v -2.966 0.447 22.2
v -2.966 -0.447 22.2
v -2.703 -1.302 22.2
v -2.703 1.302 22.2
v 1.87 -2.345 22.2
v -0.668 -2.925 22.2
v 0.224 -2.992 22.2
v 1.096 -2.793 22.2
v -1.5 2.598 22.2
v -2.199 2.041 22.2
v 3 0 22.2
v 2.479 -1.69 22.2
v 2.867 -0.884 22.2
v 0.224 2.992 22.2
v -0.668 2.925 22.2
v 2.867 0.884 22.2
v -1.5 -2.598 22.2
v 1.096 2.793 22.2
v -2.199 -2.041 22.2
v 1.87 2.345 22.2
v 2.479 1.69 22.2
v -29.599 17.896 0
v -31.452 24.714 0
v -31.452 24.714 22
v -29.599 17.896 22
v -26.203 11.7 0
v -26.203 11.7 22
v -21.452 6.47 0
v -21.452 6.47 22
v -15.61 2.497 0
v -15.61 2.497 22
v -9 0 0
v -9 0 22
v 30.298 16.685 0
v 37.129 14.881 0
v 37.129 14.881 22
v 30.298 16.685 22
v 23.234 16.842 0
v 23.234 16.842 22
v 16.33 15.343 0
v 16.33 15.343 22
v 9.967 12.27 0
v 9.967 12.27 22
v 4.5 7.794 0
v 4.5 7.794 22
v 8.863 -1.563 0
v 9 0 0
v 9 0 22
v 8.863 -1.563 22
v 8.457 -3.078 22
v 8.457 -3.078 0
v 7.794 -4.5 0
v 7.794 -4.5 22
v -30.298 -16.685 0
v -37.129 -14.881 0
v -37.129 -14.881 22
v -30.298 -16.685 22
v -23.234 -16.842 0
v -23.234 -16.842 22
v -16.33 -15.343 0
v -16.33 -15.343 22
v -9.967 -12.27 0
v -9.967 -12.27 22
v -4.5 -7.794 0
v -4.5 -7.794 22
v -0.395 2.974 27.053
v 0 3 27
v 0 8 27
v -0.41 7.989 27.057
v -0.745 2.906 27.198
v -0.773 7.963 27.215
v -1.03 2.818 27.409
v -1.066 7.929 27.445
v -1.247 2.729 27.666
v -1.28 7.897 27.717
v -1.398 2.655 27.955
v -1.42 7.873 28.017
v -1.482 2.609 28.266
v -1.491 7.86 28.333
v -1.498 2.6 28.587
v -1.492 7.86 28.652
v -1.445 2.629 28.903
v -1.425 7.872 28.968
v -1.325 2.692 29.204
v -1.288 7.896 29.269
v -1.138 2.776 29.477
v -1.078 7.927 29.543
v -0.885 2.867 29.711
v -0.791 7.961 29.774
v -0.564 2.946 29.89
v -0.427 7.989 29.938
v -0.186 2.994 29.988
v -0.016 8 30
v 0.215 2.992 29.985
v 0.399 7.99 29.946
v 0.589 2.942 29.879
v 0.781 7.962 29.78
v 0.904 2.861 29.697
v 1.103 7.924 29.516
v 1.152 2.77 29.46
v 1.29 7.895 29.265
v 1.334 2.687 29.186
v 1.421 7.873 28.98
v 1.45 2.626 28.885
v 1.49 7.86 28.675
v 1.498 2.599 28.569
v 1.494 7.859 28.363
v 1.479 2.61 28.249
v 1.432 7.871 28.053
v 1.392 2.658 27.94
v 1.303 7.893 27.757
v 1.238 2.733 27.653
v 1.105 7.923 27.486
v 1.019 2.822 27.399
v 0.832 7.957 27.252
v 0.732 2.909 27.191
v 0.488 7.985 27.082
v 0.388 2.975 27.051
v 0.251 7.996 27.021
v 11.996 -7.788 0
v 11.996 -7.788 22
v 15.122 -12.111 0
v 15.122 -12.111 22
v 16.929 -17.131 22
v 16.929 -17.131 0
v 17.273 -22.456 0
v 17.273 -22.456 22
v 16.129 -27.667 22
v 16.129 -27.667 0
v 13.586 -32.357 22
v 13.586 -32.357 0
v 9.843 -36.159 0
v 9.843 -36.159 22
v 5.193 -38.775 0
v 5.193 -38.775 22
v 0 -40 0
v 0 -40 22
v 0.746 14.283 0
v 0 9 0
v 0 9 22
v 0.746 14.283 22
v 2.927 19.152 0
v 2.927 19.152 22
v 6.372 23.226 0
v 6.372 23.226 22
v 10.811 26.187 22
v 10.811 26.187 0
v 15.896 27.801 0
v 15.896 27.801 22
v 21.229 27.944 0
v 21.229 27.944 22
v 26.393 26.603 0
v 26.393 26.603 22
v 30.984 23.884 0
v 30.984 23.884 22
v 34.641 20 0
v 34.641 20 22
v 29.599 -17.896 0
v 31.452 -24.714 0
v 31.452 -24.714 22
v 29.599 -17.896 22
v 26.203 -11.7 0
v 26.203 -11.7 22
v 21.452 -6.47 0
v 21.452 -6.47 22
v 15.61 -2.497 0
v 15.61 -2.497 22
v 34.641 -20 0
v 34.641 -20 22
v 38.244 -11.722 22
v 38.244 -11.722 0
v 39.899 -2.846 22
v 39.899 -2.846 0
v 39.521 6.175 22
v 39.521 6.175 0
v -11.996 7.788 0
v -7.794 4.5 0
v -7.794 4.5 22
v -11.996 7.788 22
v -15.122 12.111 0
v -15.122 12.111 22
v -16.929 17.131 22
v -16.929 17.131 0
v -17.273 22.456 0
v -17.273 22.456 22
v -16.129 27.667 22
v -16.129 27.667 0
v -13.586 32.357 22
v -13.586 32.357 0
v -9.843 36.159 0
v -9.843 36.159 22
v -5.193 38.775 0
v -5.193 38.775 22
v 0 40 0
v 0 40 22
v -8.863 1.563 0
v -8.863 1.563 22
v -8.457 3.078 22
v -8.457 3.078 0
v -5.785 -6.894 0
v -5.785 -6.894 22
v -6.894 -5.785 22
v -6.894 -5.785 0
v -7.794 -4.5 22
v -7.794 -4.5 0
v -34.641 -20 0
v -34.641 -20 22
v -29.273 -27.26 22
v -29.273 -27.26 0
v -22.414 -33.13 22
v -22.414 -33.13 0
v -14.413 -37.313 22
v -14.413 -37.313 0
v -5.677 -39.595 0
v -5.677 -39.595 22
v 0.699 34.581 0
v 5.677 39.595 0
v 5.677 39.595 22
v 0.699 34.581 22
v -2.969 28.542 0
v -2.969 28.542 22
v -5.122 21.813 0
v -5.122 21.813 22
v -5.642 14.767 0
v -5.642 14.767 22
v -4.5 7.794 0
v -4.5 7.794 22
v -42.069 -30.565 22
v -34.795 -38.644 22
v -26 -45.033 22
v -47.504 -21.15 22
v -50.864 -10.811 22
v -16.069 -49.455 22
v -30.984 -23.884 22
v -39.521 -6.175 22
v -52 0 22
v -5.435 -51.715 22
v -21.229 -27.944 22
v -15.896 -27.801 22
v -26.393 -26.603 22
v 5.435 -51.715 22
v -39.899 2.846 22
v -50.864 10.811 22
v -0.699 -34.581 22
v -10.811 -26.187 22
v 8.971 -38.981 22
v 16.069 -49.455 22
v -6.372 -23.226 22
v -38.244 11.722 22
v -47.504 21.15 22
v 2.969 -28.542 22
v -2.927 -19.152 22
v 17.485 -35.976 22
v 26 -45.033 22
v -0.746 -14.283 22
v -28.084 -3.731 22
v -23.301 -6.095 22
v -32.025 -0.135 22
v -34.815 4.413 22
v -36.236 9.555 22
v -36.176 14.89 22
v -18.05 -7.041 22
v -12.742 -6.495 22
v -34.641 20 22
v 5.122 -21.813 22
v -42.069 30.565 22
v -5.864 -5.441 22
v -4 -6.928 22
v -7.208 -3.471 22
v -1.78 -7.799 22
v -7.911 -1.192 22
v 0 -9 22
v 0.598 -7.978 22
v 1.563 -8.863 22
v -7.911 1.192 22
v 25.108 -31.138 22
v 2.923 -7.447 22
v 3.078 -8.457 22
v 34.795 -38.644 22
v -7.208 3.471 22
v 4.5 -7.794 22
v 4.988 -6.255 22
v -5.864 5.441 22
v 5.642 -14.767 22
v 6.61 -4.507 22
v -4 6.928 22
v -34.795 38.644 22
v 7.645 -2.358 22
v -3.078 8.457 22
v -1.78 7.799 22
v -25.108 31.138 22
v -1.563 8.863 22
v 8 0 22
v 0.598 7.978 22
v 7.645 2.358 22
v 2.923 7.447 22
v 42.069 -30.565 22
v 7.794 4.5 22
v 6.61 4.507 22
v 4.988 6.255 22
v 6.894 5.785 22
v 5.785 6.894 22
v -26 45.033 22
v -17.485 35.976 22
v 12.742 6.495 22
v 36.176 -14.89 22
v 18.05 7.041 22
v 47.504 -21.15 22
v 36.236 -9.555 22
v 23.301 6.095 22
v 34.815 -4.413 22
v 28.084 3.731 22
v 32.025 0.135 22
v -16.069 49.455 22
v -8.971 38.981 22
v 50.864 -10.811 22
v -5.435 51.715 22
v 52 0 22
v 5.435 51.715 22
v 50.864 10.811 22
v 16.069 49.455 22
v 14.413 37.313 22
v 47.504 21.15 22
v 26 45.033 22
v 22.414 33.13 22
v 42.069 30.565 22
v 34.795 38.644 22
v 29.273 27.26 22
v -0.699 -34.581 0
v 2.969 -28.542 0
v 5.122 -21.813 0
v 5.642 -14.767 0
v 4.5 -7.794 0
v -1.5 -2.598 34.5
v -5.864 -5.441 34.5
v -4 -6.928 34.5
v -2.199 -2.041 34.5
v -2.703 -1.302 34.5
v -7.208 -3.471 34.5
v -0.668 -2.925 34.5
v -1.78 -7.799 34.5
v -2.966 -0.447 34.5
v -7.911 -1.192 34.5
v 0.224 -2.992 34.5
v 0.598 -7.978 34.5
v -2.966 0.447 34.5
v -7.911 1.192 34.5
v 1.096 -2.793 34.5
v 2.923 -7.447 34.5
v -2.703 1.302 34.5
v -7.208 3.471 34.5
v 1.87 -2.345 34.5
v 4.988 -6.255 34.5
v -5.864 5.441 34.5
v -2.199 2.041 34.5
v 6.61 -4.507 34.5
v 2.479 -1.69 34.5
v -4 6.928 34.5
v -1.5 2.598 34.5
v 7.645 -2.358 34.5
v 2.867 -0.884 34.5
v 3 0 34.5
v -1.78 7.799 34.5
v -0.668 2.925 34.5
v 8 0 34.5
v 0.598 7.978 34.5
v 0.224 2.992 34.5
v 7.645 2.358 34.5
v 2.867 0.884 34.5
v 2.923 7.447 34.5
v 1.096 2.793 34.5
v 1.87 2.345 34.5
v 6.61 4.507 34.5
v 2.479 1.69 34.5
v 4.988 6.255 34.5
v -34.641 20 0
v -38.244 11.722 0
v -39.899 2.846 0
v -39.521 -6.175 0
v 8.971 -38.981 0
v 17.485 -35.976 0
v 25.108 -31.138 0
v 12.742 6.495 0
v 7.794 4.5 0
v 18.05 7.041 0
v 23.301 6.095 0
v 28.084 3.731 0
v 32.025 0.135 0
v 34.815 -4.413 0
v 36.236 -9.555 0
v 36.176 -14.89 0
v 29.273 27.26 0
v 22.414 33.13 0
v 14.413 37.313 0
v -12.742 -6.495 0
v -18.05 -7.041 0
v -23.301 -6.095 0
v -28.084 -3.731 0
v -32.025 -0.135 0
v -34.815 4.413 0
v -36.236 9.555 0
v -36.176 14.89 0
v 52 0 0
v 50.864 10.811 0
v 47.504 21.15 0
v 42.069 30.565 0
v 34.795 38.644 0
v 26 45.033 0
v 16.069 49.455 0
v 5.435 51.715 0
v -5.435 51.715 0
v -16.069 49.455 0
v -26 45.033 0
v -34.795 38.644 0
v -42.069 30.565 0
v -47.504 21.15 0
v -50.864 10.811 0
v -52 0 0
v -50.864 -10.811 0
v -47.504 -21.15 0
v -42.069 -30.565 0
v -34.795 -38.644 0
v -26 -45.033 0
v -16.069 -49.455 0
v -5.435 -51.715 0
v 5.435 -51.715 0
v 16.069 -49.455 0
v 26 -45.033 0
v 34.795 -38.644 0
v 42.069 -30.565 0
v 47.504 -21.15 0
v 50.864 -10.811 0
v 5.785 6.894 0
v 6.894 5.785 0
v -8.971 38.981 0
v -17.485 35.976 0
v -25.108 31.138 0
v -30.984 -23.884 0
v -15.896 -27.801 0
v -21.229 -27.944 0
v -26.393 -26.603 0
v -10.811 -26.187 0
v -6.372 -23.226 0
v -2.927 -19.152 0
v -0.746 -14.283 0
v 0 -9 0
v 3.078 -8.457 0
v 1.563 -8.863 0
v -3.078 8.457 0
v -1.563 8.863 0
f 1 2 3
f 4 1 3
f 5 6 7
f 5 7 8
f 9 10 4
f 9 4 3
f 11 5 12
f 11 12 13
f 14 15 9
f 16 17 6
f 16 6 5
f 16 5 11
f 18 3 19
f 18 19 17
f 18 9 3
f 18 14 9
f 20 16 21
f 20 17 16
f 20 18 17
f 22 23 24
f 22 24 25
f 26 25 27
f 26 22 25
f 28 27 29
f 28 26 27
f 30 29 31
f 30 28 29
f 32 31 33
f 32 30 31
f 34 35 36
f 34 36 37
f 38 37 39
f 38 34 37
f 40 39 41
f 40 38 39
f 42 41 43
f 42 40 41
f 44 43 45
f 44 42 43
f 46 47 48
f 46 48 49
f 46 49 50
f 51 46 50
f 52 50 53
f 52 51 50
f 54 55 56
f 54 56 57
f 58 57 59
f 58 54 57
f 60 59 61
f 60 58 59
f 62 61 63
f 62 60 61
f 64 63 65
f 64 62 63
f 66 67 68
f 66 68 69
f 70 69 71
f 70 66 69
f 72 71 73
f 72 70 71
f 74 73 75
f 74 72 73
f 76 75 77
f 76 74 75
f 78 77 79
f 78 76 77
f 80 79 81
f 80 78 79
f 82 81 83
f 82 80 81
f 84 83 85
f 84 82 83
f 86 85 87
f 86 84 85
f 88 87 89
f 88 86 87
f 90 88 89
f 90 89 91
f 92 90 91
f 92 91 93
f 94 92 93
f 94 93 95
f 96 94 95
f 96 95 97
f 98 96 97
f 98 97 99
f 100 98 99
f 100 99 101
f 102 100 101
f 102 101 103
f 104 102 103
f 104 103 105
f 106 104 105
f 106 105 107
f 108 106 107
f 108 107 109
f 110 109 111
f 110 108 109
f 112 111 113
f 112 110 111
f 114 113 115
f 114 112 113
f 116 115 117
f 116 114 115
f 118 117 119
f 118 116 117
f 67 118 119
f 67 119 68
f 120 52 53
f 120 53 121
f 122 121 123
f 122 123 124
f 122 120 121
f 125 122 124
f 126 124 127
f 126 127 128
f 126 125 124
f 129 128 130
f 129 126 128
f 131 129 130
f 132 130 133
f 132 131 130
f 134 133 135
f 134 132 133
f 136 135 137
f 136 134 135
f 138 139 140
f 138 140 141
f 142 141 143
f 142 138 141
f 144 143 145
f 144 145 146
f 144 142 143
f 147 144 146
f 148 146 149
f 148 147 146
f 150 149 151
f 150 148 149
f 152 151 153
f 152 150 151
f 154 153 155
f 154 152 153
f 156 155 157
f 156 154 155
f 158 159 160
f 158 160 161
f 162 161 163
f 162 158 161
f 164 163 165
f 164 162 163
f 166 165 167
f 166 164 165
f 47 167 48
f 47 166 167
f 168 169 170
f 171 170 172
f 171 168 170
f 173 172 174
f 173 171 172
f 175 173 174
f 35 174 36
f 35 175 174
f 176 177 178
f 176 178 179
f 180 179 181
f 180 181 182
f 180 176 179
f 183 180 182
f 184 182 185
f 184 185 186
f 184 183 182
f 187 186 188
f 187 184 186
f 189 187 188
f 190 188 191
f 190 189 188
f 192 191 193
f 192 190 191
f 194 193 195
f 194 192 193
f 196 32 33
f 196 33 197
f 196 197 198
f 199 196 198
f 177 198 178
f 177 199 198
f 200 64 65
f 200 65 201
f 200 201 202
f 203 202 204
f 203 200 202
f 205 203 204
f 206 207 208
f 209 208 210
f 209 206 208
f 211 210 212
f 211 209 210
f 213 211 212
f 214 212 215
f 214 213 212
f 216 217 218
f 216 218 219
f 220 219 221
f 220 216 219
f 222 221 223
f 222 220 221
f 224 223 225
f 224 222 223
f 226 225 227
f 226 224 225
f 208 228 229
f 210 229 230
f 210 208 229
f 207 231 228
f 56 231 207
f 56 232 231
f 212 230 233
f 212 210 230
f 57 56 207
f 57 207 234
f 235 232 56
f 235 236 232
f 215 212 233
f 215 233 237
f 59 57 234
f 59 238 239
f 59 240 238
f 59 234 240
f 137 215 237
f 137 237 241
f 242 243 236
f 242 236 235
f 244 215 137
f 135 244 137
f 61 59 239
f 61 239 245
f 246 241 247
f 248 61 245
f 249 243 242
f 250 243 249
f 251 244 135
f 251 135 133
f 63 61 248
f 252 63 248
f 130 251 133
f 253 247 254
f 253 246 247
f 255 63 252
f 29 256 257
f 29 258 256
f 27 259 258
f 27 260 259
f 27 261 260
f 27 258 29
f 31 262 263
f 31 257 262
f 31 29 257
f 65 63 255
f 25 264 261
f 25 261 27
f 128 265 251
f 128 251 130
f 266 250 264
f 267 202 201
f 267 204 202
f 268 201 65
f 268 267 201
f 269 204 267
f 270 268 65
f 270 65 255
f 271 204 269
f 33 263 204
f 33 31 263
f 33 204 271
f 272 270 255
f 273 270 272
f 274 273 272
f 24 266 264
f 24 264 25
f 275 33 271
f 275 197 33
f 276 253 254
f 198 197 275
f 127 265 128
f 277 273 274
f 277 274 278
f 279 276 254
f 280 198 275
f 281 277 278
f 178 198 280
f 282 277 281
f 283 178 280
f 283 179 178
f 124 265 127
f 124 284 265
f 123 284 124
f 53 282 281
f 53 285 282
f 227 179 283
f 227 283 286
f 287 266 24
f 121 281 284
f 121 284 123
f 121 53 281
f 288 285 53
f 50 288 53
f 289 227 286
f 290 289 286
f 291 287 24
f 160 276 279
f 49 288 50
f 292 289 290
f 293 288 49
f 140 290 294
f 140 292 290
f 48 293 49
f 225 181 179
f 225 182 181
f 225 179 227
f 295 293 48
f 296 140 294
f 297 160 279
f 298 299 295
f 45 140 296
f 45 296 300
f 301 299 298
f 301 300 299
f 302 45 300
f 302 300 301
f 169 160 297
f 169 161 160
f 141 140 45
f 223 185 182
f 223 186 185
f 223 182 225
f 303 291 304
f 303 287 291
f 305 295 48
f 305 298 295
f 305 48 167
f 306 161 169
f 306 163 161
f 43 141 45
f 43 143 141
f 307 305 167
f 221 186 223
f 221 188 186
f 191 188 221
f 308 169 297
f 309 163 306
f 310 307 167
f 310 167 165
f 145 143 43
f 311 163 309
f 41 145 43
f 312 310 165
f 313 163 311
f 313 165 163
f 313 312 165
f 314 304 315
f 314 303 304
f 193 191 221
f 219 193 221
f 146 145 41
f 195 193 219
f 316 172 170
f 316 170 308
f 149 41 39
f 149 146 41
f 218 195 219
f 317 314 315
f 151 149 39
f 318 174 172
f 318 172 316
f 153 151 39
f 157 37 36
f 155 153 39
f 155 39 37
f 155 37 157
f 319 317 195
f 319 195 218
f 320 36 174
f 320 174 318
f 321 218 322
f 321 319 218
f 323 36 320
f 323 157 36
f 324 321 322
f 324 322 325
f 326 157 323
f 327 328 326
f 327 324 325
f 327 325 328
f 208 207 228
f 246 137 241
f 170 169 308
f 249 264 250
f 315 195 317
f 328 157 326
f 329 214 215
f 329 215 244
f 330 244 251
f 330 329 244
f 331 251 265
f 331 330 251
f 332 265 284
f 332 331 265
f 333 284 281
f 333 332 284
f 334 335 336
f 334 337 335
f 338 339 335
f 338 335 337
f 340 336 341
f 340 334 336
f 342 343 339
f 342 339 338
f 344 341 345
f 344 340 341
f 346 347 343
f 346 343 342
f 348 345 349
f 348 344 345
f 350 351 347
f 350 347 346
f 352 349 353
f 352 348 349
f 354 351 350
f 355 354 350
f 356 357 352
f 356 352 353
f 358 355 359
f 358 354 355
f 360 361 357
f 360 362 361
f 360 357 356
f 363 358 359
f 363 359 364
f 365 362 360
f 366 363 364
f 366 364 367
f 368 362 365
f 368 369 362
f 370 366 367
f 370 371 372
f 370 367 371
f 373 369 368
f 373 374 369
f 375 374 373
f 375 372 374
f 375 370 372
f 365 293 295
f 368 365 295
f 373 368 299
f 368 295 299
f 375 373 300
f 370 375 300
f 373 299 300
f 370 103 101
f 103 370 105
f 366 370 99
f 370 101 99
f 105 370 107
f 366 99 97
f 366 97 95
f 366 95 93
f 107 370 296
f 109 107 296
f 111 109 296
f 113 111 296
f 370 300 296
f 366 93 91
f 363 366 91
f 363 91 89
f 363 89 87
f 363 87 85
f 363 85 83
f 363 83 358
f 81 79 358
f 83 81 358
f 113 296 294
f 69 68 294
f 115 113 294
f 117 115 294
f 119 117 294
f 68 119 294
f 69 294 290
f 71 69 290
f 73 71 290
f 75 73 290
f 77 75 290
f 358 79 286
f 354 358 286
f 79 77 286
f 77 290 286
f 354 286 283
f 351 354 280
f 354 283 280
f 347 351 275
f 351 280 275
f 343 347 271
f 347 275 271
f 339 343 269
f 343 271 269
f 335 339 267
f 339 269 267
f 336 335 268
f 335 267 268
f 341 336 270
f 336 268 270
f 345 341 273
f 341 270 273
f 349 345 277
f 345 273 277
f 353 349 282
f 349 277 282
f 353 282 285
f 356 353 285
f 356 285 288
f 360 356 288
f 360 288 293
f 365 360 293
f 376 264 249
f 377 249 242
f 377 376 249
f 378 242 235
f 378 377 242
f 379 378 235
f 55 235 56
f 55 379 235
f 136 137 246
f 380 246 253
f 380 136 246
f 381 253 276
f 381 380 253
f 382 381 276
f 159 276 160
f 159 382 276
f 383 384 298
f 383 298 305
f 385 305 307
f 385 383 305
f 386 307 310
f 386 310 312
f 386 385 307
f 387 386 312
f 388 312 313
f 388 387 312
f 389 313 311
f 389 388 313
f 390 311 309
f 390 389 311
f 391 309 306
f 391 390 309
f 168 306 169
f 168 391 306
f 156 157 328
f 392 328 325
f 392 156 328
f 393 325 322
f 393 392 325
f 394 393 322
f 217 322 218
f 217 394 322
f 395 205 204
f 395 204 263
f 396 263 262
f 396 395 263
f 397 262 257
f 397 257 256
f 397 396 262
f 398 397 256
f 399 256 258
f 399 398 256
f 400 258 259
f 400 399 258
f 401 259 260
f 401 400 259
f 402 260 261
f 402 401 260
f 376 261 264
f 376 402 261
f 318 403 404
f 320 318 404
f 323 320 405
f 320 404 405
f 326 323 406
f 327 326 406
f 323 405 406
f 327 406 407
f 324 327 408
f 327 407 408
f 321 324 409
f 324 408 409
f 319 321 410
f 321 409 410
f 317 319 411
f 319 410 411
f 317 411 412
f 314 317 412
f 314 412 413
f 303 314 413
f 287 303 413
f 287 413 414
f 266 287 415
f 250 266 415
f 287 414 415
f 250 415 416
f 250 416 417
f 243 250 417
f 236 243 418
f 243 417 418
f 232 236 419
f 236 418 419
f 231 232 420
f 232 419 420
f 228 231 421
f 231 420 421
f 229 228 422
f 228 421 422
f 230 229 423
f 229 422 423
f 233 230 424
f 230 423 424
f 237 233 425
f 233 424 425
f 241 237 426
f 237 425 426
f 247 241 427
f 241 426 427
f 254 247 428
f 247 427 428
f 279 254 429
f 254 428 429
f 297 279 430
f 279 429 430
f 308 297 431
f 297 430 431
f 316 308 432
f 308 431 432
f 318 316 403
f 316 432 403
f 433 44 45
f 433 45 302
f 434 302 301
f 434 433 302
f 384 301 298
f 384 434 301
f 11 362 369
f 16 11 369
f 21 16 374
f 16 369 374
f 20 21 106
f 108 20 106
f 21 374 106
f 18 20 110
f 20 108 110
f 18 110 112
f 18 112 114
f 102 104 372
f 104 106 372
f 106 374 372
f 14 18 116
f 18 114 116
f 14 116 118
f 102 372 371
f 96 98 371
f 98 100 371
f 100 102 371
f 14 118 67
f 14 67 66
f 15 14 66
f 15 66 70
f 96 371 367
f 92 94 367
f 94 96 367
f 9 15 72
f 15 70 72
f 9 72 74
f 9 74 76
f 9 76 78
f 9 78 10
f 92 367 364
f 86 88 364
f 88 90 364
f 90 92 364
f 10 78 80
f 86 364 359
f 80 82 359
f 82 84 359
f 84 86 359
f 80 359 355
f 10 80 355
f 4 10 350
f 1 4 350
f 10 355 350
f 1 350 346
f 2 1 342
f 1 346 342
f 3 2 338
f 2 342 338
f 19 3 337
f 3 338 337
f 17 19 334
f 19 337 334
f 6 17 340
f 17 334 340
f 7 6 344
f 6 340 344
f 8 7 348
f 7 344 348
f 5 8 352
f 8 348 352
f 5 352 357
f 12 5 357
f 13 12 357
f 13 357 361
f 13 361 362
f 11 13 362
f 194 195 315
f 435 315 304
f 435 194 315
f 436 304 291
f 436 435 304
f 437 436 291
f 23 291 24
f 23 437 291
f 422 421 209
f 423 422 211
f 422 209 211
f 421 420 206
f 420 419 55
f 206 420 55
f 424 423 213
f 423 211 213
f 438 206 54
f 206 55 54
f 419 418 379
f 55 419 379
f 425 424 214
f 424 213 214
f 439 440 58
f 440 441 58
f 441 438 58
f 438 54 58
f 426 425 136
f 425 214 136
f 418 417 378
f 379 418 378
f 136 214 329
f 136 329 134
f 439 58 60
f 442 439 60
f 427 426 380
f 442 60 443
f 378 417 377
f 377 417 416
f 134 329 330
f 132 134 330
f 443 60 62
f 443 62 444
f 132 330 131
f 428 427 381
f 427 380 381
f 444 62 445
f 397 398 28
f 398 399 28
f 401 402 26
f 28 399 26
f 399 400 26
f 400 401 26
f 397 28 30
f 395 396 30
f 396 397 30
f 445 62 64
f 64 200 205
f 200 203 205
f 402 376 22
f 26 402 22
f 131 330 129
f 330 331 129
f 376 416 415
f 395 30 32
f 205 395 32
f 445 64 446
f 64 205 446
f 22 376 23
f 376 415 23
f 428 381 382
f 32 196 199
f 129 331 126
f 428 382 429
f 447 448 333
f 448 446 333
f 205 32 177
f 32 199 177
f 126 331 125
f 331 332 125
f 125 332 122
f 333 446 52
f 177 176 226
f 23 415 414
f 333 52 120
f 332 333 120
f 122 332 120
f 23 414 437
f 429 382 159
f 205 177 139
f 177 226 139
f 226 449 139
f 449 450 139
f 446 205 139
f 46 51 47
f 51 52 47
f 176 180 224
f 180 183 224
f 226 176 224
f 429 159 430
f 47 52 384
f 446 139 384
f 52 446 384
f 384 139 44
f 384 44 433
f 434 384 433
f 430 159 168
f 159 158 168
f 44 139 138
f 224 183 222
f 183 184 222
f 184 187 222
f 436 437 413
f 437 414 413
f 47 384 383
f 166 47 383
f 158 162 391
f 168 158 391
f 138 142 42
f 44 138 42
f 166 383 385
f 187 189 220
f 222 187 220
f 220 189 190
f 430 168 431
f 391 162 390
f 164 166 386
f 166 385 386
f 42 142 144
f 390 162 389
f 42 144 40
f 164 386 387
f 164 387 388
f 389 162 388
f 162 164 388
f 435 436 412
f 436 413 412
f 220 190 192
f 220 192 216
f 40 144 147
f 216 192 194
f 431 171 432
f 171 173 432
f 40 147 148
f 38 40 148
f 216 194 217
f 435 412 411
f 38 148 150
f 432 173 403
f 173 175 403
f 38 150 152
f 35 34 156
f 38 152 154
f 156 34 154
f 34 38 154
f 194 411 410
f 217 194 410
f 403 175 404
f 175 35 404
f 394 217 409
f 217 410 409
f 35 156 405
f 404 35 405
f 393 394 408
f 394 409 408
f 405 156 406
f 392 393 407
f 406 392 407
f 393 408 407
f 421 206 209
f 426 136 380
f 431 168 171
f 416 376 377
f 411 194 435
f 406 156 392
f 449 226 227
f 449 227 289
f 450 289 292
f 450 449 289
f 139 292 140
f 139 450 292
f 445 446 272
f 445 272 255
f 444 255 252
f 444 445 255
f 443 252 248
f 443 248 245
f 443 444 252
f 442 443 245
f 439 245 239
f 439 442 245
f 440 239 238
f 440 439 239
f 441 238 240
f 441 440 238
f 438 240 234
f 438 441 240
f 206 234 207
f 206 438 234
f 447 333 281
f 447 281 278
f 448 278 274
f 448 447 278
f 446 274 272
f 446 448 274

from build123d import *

# Parameters (mm, degrees)
SKETCH1_R             = 52
WHEEL_DEPTH           = 22
SKETCH2_R             = 8
BOSS_DEPTH            = 12.5
SKETCH3_R             = 3
BORE_DEPTH            = 12.3
SKETCH4_R             = 1.5
GRUB_SCREW_HOLE_DEPTH = 82.229612827
SPOKE_CUT_DEPTH       = 82.229612869
SPOKES_CUT_COUNT      = 6


with BuildPart() as part:
    # Sketch1 → wheel (new body)
    with BuildSketch(Plane.XY):
        Circle(SKETCH1_R)
    extrude(amount=WHEEL_DEPTH)

    # Sketch2 → boss (add)
    with BuildSketch(Plane.XY.offset(22)):
        Circle(SKETCH2_R)
    extrude(amount=BOSS_DEPTH)

    # Sketch3 → bore (cut)
    with BuildSketch(Plane.XY.offset(34.5)):
        Circle(SKETCH3_R)
    extrude(amount=-BORE_DEPTH, mode=Mode.SUBTRACT)

    # Sketch4 → grub screw hole (cut, through all)
    with BuildSketch(Plane(origin=(0, 0, 0), x_dir=(1, 0, 0), z_dir=(0, 1, 0))):
        with Locations(Location((0, -28.5, 0), (0, 0, 90))):
            Circle(SKETCH4_R)
    extrude(amount=GRUB_SCREW_HOLE_DEPTH, mode=Mode.SUBTRACT)

    # Sketch5 → spoke cut (cut, through all)
    with BuildSketch(Plane(origin=(0, 0, 0), x_dir=(-1, 0, 0), z_dir=(0, 0, -1))):
        with BuildLine():
            ThreePointArc((7.794228634, 4.5), (16.884139684, 25.101375915), (0, 40))
            ThreePointArc((0, 40), (17.484724527, 35.976164446), (31.451666243, 24.714220411))
            ThreePointArc((31.451666243, 24.714220411), (23.981825586, 8.94497388), (9, 0))
            ThreePointArc((9, 0), (8.693332437, 2.329371406), (7.794228634, 4.5))
        make_face()
    spoke_cut = extrude(amount=-SPOKE_CUT_DEPTH, mode=Mode.SUBTRACT)

    # spokes cut: spoke cut ×6 about axis
    spokes_cut_axis = Axis((0, 0, 0), (0, 0, 1))
    for i in range(1, SPOKES_CUT_COUNT):
        add(spoke_cut.rotate(spokes_cut_axis, i * 360 / SPOKES_CUT_COUNT), mode=Mode.SUBTRACT)


solid = part.part
